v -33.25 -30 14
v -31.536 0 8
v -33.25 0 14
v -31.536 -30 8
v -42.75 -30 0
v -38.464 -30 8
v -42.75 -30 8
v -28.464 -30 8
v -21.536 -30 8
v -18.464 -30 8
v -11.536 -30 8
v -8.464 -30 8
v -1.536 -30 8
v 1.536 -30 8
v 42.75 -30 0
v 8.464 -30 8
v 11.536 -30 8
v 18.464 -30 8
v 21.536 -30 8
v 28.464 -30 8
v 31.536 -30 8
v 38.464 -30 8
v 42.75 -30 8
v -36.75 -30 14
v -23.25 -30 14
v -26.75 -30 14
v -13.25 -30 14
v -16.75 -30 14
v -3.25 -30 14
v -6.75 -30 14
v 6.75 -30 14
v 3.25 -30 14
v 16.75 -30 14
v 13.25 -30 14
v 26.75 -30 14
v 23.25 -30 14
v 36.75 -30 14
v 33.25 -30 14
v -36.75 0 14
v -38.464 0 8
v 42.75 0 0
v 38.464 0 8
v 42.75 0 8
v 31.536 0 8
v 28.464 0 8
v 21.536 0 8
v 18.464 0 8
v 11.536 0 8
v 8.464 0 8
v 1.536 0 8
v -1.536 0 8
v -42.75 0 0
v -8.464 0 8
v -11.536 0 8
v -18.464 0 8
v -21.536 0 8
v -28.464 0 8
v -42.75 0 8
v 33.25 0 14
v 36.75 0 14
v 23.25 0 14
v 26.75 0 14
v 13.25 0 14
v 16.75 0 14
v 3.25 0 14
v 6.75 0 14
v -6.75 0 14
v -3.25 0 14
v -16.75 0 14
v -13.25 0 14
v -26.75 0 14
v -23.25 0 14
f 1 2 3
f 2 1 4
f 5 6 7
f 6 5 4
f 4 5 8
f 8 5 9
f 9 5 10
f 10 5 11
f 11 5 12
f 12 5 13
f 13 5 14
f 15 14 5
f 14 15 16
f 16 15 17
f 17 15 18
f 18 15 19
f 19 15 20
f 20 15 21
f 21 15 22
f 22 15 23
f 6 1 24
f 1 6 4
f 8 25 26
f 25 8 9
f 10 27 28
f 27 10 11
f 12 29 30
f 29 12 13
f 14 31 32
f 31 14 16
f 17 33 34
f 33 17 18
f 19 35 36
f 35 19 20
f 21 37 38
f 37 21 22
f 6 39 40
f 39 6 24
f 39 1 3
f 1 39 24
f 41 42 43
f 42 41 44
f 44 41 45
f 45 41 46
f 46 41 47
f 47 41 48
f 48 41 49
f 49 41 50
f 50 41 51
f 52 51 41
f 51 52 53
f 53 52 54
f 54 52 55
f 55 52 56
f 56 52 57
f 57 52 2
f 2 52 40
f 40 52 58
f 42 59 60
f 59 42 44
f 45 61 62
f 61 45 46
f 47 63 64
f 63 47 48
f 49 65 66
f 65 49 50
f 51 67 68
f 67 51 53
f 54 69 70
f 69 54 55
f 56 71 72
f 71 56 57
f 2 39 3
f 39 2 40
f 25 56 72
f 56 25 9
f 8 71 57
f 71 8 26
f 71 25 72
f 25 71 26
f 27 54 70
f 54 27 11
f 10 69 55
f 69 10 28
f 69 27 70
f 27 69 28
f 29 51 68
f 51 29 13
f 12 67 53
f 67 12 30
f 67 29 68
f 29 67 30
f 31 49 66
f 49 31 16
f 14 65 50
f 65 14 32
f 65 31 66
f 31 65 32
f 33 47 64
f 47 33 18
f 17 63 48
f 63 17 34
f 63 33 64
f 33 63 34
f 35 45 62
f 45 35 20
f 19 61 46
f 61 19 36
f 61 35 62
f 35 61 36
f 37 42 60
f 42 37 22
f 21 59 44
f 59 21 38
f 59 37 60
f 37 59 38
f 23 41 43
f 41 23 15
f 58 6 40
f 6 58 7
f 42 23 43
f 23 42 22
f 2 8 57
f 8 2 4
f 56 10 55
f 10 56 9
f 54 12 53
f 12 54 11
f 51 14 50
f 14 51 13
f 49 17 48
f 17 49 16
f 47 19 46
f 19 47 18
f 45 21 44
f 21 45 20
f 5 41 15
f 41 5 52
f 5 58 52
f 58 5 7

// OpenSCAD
$fn = 32;

// ----------------------------------------------------------------------
// Toothed rack, 8 teeth
// 10 mm pitch, 6 mm teeth
// ----------------------------------------------------------------------

// --- parameters (mm) ---
bar_w = 30;     // bar width (Y)
bar_h = 8;      // bar height (Z)
teeth = 8;      // number of teeth
pitch = 10;     // tooth pitch
tooth_h = 6;    // tooth height above the bar
root_w = 7.5;   // tooth width at the root
crest_w = 3.5;  // tooth width at the crest

// --- derived feature positions (mm) ---
span = (teeth - 1) * pitch;  // = 70   distance between the outer teeth
bar_l = span + root_w + 8;   // = 85.5   bar length: teeth plus 4 mm at each end
tooth_x = -span / 2;         // = -35   X of the first tooth
height = bar_h + tooth_h;    // = 14   overall height
feature_centers = [
  [tooth_x + 0 * pitch, -bar_w / 2],
  [tooth_x + 1 * pitch, -bar_w / 2],
  [tooth_x + 2 * pitch, -bar_w / 2],
  [tooth_x + 3 * pitch, -bar_w / 2],
  [tooth_x + 4 * pitch, -bar_w / 2],
  [tooth_x + 5 * pitch, -bar_w / 2],
  [tooth_x + 6 * pitch, -bar_w / 2],
  [tooth_x + 7 * pitch, -bar_w / 2]
];   // tooth centre line, drives the tooth loop

// bar with a rack of teeth, one extruded trapezoium per centre
module rack_tooth() {
  linear_extrude(height = bar_w)
    polygon(points = [
      [0, 0],
      [root_w, 0],
      [root_w / 2 + crest_w / 2, tooth_h + 1],
      [root_w / 2 - crest_w / 2, tooth_h + 1]
    ]);
}

union() {
  translate([-bar_l / 2, -bar_w, 0]) cube([bar_l, bar_w, bar_h]);
  for (centre = feature_centers)
    translate([centre[0] - root_w / 2, 0, bar_h - 1]) rotate([90, 0, 0]) rack_tooth();
}
